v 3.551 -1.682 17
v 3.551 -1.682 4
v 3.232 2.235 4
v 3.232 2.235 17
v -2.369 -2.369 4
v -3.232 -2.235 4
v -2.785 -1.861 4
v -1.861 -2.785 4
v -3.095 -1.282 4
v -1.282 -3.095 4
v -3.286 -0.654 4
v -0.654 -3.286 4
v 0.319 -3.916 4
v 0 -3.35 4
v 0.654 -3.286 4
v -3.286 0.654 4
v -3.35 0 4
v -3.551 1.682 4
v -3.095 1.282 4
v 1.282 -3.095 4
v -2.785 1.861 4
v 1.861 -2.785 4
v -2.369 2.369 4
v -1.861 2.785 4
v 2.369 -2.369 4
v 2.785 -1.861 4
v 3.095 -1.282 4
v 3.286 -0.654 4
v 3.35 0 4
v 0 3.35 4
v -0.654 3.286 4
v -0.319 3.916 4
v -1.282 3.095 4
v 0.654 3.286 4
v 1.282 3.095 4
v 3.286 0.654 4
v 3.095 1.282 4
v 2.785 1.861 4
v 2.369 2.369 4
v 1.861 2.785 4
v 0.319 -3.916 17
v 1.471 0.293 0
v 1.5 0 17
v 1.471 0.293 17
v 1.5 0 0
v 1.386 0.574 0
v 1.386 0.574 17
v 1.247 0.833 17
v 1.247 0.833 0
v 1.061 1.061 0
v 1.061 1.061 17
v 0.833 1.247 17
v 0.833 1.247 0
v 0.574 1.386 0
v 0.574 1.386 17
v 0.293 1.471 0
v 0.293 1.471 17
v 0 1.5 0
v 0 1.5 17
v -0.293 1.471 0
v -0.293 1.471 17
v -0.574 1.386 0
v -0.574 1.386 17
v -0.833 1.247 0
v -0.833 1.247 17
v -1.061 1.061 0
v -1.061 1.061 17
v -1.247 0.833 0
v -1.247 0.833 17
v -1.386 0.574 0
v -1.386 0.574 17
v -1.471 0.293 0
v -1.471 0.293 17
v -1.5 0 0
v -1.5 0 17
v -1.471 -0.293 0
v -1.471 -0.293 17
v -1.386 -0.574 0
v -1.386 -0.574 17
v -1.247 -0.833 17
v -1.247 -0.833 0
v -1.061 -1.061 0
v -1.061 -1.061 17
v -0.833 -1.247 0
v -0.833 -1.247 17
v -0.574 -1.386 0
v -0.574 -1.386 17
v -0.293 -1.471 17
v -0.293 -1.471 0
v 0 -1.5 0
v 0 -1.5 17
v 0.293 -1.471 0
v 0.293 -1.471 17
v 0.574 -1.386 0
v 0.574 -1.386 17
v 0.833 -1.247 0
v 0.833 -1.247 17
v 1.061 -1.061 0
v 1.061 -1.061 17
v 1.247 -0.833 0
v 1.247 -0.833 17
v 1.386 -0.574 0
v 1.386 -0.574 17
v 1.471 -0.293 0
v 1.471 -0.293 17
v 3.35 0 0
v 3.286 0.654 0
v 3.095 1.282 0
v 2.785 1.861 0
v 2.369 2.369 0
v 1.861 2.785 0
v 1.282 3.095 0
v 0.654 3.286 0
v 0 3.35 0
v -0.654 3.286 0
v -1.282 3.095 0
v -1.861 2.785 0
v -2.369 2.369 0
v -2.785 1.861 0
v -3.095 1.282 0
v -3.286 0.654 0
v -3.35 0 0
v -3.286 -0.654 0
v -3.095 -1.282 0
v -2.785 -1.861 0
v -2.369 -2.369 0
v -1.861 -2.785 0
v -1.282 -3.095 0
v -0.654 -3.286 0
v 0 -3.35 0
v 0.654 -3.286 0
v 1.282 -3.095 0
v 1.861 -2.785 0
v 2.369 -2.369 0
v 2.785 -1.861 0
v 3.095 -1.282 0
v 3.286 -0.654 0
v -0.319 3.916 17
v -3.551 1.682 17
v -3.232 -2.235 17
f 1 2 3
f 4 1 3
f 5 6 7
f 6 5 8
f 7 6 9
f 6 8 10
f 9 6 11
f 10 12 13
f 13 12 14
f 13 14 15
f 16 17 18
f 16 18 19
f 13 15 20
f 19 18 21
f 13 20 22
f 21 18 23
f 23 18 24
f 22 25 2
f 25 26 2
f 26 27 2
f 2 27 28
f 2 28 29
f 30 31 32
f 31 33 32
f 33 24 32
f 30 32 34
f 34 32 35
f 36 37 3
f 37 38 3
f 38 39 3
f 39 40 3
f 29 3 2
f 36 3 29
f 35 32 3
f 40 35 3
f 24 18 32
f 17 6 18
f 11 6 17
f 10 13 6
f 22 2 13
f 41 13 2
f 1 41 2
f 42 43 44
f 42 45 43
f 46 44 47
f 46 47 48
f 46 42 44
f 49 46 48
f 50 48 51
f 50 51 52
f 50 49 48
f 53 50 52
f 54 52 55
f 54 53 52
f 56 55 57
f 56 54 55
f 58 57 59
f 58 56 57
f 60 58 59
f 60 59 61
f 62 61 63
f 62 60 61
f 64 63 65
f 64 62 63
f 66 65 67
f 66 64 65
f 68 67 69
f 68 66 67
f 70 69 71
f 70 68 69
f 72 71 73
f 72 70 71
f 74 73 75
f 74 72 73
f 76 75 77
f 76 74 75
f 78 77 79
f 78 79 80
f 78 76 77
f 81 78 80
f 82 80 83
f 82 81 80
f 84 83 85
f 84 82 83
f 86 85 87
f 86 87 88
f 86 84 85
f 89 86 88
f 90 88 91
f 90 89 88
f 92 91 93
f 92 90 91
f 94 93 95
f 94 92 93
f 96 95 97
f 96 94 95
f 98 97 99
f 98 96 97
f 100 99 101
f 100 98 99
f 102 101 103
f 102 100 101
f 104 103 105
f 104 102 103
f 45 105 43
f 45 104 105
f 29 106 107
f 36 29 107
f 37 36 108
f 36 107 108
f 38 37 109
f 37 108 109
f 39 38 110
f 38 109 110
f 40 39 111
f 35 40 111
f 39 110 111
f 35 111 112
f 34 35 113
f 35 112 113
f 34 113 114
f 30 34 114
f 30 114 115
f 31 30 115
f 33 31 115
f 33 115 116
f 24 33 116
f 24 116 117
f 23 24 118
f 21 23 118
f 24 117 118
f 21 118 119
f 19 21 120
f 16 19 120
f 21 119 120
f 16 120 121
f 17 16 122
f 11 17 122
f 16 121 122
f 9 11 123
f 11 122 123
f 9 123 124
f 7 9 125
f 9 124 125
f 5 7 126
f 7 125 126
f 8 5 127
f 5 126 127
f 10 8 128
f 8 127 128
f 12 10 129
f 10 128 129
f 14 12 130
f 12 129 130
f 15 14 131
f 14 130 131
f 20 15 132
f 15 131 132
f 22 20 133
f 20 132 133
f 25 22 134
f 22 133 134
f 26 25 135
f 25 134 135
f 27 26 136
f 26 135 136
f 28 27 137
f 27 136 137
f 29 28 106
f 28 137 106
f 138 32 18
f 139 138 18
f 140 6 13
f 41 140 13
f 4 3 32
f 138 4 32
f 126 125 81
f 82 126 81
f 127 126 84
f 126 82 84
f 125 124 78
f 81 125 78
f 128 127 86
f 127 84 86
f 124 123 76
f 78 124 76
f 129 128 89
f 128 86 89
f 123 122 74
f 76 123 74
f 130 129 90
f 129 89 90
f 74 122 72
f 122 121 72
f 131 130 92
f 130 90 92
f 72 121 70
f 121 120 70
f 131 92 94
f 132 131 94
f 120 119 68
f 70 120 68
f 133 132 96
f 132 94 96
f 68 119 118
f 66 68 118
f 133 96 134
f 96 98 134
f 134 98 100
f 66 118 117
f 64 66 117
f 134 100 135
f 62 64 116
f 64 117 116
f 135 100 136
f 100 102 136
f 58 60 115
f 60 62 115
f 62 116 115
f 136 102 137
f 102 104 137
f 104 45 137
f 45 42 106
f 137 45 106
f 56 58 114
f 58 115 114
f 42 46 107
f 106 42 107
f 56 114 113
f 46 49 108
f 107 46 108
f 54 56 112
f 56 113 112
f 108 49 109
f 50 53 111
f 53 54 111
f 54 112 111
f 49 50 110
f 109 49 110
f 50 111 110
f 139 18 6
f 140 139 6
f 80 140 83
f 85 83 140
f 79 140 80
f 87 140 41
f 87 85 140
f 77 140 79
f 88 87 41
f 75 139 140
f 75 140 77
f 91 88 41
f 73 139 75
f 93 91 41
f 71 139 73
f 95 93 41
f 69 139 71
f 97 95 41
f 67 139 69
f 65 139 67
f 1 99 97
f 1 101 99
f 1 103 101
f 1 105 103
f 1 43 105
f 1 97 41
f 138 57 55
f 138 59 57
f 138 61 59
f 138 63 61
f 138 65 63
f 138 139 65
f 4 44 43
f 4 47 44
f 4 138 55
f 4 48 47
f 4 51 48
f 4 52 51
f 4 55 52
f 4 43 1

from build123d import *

# Parameters (mm, degrees)
SKETCH_1_R      = 3.35
SKETCH_1_R_2    = 1.5
EXTRUDE_1_DEPTH = 4
SKETCH_3_R      = 1.5
EXTRUDE_2_DEPTH = 13


with BuildPart() as part:
    # 草图1 → 凸台-拉伸1 (new body)
    with BuildSketch(Plane.XY):
        Circle(SKETCH_1_R)
        Circle(SKETCH_1_R_2, mode=Mode.SUBTRACT)
    extrude(amount=EXTRUDE_1_DEPTH)

    # 草图3 → 凸台-拉伸2 (add)
    with BuildSketch(Plane.XY.offset(4)):
        Polygon((3.551375818, -1.681818945), (3.23218584, 2.234672205), (-0.319189978, 3.916491149), (-3.551375818, 1.681818945), (-3.23218584, -2.234672205), (0.319189978, -3.916491149), align=None)
        Circle(SKETCH_3_R, mode=Mode.SUBTRACT)
    extrude(amount=EXTRUDE_2_DEPTH)


solid = part.part
